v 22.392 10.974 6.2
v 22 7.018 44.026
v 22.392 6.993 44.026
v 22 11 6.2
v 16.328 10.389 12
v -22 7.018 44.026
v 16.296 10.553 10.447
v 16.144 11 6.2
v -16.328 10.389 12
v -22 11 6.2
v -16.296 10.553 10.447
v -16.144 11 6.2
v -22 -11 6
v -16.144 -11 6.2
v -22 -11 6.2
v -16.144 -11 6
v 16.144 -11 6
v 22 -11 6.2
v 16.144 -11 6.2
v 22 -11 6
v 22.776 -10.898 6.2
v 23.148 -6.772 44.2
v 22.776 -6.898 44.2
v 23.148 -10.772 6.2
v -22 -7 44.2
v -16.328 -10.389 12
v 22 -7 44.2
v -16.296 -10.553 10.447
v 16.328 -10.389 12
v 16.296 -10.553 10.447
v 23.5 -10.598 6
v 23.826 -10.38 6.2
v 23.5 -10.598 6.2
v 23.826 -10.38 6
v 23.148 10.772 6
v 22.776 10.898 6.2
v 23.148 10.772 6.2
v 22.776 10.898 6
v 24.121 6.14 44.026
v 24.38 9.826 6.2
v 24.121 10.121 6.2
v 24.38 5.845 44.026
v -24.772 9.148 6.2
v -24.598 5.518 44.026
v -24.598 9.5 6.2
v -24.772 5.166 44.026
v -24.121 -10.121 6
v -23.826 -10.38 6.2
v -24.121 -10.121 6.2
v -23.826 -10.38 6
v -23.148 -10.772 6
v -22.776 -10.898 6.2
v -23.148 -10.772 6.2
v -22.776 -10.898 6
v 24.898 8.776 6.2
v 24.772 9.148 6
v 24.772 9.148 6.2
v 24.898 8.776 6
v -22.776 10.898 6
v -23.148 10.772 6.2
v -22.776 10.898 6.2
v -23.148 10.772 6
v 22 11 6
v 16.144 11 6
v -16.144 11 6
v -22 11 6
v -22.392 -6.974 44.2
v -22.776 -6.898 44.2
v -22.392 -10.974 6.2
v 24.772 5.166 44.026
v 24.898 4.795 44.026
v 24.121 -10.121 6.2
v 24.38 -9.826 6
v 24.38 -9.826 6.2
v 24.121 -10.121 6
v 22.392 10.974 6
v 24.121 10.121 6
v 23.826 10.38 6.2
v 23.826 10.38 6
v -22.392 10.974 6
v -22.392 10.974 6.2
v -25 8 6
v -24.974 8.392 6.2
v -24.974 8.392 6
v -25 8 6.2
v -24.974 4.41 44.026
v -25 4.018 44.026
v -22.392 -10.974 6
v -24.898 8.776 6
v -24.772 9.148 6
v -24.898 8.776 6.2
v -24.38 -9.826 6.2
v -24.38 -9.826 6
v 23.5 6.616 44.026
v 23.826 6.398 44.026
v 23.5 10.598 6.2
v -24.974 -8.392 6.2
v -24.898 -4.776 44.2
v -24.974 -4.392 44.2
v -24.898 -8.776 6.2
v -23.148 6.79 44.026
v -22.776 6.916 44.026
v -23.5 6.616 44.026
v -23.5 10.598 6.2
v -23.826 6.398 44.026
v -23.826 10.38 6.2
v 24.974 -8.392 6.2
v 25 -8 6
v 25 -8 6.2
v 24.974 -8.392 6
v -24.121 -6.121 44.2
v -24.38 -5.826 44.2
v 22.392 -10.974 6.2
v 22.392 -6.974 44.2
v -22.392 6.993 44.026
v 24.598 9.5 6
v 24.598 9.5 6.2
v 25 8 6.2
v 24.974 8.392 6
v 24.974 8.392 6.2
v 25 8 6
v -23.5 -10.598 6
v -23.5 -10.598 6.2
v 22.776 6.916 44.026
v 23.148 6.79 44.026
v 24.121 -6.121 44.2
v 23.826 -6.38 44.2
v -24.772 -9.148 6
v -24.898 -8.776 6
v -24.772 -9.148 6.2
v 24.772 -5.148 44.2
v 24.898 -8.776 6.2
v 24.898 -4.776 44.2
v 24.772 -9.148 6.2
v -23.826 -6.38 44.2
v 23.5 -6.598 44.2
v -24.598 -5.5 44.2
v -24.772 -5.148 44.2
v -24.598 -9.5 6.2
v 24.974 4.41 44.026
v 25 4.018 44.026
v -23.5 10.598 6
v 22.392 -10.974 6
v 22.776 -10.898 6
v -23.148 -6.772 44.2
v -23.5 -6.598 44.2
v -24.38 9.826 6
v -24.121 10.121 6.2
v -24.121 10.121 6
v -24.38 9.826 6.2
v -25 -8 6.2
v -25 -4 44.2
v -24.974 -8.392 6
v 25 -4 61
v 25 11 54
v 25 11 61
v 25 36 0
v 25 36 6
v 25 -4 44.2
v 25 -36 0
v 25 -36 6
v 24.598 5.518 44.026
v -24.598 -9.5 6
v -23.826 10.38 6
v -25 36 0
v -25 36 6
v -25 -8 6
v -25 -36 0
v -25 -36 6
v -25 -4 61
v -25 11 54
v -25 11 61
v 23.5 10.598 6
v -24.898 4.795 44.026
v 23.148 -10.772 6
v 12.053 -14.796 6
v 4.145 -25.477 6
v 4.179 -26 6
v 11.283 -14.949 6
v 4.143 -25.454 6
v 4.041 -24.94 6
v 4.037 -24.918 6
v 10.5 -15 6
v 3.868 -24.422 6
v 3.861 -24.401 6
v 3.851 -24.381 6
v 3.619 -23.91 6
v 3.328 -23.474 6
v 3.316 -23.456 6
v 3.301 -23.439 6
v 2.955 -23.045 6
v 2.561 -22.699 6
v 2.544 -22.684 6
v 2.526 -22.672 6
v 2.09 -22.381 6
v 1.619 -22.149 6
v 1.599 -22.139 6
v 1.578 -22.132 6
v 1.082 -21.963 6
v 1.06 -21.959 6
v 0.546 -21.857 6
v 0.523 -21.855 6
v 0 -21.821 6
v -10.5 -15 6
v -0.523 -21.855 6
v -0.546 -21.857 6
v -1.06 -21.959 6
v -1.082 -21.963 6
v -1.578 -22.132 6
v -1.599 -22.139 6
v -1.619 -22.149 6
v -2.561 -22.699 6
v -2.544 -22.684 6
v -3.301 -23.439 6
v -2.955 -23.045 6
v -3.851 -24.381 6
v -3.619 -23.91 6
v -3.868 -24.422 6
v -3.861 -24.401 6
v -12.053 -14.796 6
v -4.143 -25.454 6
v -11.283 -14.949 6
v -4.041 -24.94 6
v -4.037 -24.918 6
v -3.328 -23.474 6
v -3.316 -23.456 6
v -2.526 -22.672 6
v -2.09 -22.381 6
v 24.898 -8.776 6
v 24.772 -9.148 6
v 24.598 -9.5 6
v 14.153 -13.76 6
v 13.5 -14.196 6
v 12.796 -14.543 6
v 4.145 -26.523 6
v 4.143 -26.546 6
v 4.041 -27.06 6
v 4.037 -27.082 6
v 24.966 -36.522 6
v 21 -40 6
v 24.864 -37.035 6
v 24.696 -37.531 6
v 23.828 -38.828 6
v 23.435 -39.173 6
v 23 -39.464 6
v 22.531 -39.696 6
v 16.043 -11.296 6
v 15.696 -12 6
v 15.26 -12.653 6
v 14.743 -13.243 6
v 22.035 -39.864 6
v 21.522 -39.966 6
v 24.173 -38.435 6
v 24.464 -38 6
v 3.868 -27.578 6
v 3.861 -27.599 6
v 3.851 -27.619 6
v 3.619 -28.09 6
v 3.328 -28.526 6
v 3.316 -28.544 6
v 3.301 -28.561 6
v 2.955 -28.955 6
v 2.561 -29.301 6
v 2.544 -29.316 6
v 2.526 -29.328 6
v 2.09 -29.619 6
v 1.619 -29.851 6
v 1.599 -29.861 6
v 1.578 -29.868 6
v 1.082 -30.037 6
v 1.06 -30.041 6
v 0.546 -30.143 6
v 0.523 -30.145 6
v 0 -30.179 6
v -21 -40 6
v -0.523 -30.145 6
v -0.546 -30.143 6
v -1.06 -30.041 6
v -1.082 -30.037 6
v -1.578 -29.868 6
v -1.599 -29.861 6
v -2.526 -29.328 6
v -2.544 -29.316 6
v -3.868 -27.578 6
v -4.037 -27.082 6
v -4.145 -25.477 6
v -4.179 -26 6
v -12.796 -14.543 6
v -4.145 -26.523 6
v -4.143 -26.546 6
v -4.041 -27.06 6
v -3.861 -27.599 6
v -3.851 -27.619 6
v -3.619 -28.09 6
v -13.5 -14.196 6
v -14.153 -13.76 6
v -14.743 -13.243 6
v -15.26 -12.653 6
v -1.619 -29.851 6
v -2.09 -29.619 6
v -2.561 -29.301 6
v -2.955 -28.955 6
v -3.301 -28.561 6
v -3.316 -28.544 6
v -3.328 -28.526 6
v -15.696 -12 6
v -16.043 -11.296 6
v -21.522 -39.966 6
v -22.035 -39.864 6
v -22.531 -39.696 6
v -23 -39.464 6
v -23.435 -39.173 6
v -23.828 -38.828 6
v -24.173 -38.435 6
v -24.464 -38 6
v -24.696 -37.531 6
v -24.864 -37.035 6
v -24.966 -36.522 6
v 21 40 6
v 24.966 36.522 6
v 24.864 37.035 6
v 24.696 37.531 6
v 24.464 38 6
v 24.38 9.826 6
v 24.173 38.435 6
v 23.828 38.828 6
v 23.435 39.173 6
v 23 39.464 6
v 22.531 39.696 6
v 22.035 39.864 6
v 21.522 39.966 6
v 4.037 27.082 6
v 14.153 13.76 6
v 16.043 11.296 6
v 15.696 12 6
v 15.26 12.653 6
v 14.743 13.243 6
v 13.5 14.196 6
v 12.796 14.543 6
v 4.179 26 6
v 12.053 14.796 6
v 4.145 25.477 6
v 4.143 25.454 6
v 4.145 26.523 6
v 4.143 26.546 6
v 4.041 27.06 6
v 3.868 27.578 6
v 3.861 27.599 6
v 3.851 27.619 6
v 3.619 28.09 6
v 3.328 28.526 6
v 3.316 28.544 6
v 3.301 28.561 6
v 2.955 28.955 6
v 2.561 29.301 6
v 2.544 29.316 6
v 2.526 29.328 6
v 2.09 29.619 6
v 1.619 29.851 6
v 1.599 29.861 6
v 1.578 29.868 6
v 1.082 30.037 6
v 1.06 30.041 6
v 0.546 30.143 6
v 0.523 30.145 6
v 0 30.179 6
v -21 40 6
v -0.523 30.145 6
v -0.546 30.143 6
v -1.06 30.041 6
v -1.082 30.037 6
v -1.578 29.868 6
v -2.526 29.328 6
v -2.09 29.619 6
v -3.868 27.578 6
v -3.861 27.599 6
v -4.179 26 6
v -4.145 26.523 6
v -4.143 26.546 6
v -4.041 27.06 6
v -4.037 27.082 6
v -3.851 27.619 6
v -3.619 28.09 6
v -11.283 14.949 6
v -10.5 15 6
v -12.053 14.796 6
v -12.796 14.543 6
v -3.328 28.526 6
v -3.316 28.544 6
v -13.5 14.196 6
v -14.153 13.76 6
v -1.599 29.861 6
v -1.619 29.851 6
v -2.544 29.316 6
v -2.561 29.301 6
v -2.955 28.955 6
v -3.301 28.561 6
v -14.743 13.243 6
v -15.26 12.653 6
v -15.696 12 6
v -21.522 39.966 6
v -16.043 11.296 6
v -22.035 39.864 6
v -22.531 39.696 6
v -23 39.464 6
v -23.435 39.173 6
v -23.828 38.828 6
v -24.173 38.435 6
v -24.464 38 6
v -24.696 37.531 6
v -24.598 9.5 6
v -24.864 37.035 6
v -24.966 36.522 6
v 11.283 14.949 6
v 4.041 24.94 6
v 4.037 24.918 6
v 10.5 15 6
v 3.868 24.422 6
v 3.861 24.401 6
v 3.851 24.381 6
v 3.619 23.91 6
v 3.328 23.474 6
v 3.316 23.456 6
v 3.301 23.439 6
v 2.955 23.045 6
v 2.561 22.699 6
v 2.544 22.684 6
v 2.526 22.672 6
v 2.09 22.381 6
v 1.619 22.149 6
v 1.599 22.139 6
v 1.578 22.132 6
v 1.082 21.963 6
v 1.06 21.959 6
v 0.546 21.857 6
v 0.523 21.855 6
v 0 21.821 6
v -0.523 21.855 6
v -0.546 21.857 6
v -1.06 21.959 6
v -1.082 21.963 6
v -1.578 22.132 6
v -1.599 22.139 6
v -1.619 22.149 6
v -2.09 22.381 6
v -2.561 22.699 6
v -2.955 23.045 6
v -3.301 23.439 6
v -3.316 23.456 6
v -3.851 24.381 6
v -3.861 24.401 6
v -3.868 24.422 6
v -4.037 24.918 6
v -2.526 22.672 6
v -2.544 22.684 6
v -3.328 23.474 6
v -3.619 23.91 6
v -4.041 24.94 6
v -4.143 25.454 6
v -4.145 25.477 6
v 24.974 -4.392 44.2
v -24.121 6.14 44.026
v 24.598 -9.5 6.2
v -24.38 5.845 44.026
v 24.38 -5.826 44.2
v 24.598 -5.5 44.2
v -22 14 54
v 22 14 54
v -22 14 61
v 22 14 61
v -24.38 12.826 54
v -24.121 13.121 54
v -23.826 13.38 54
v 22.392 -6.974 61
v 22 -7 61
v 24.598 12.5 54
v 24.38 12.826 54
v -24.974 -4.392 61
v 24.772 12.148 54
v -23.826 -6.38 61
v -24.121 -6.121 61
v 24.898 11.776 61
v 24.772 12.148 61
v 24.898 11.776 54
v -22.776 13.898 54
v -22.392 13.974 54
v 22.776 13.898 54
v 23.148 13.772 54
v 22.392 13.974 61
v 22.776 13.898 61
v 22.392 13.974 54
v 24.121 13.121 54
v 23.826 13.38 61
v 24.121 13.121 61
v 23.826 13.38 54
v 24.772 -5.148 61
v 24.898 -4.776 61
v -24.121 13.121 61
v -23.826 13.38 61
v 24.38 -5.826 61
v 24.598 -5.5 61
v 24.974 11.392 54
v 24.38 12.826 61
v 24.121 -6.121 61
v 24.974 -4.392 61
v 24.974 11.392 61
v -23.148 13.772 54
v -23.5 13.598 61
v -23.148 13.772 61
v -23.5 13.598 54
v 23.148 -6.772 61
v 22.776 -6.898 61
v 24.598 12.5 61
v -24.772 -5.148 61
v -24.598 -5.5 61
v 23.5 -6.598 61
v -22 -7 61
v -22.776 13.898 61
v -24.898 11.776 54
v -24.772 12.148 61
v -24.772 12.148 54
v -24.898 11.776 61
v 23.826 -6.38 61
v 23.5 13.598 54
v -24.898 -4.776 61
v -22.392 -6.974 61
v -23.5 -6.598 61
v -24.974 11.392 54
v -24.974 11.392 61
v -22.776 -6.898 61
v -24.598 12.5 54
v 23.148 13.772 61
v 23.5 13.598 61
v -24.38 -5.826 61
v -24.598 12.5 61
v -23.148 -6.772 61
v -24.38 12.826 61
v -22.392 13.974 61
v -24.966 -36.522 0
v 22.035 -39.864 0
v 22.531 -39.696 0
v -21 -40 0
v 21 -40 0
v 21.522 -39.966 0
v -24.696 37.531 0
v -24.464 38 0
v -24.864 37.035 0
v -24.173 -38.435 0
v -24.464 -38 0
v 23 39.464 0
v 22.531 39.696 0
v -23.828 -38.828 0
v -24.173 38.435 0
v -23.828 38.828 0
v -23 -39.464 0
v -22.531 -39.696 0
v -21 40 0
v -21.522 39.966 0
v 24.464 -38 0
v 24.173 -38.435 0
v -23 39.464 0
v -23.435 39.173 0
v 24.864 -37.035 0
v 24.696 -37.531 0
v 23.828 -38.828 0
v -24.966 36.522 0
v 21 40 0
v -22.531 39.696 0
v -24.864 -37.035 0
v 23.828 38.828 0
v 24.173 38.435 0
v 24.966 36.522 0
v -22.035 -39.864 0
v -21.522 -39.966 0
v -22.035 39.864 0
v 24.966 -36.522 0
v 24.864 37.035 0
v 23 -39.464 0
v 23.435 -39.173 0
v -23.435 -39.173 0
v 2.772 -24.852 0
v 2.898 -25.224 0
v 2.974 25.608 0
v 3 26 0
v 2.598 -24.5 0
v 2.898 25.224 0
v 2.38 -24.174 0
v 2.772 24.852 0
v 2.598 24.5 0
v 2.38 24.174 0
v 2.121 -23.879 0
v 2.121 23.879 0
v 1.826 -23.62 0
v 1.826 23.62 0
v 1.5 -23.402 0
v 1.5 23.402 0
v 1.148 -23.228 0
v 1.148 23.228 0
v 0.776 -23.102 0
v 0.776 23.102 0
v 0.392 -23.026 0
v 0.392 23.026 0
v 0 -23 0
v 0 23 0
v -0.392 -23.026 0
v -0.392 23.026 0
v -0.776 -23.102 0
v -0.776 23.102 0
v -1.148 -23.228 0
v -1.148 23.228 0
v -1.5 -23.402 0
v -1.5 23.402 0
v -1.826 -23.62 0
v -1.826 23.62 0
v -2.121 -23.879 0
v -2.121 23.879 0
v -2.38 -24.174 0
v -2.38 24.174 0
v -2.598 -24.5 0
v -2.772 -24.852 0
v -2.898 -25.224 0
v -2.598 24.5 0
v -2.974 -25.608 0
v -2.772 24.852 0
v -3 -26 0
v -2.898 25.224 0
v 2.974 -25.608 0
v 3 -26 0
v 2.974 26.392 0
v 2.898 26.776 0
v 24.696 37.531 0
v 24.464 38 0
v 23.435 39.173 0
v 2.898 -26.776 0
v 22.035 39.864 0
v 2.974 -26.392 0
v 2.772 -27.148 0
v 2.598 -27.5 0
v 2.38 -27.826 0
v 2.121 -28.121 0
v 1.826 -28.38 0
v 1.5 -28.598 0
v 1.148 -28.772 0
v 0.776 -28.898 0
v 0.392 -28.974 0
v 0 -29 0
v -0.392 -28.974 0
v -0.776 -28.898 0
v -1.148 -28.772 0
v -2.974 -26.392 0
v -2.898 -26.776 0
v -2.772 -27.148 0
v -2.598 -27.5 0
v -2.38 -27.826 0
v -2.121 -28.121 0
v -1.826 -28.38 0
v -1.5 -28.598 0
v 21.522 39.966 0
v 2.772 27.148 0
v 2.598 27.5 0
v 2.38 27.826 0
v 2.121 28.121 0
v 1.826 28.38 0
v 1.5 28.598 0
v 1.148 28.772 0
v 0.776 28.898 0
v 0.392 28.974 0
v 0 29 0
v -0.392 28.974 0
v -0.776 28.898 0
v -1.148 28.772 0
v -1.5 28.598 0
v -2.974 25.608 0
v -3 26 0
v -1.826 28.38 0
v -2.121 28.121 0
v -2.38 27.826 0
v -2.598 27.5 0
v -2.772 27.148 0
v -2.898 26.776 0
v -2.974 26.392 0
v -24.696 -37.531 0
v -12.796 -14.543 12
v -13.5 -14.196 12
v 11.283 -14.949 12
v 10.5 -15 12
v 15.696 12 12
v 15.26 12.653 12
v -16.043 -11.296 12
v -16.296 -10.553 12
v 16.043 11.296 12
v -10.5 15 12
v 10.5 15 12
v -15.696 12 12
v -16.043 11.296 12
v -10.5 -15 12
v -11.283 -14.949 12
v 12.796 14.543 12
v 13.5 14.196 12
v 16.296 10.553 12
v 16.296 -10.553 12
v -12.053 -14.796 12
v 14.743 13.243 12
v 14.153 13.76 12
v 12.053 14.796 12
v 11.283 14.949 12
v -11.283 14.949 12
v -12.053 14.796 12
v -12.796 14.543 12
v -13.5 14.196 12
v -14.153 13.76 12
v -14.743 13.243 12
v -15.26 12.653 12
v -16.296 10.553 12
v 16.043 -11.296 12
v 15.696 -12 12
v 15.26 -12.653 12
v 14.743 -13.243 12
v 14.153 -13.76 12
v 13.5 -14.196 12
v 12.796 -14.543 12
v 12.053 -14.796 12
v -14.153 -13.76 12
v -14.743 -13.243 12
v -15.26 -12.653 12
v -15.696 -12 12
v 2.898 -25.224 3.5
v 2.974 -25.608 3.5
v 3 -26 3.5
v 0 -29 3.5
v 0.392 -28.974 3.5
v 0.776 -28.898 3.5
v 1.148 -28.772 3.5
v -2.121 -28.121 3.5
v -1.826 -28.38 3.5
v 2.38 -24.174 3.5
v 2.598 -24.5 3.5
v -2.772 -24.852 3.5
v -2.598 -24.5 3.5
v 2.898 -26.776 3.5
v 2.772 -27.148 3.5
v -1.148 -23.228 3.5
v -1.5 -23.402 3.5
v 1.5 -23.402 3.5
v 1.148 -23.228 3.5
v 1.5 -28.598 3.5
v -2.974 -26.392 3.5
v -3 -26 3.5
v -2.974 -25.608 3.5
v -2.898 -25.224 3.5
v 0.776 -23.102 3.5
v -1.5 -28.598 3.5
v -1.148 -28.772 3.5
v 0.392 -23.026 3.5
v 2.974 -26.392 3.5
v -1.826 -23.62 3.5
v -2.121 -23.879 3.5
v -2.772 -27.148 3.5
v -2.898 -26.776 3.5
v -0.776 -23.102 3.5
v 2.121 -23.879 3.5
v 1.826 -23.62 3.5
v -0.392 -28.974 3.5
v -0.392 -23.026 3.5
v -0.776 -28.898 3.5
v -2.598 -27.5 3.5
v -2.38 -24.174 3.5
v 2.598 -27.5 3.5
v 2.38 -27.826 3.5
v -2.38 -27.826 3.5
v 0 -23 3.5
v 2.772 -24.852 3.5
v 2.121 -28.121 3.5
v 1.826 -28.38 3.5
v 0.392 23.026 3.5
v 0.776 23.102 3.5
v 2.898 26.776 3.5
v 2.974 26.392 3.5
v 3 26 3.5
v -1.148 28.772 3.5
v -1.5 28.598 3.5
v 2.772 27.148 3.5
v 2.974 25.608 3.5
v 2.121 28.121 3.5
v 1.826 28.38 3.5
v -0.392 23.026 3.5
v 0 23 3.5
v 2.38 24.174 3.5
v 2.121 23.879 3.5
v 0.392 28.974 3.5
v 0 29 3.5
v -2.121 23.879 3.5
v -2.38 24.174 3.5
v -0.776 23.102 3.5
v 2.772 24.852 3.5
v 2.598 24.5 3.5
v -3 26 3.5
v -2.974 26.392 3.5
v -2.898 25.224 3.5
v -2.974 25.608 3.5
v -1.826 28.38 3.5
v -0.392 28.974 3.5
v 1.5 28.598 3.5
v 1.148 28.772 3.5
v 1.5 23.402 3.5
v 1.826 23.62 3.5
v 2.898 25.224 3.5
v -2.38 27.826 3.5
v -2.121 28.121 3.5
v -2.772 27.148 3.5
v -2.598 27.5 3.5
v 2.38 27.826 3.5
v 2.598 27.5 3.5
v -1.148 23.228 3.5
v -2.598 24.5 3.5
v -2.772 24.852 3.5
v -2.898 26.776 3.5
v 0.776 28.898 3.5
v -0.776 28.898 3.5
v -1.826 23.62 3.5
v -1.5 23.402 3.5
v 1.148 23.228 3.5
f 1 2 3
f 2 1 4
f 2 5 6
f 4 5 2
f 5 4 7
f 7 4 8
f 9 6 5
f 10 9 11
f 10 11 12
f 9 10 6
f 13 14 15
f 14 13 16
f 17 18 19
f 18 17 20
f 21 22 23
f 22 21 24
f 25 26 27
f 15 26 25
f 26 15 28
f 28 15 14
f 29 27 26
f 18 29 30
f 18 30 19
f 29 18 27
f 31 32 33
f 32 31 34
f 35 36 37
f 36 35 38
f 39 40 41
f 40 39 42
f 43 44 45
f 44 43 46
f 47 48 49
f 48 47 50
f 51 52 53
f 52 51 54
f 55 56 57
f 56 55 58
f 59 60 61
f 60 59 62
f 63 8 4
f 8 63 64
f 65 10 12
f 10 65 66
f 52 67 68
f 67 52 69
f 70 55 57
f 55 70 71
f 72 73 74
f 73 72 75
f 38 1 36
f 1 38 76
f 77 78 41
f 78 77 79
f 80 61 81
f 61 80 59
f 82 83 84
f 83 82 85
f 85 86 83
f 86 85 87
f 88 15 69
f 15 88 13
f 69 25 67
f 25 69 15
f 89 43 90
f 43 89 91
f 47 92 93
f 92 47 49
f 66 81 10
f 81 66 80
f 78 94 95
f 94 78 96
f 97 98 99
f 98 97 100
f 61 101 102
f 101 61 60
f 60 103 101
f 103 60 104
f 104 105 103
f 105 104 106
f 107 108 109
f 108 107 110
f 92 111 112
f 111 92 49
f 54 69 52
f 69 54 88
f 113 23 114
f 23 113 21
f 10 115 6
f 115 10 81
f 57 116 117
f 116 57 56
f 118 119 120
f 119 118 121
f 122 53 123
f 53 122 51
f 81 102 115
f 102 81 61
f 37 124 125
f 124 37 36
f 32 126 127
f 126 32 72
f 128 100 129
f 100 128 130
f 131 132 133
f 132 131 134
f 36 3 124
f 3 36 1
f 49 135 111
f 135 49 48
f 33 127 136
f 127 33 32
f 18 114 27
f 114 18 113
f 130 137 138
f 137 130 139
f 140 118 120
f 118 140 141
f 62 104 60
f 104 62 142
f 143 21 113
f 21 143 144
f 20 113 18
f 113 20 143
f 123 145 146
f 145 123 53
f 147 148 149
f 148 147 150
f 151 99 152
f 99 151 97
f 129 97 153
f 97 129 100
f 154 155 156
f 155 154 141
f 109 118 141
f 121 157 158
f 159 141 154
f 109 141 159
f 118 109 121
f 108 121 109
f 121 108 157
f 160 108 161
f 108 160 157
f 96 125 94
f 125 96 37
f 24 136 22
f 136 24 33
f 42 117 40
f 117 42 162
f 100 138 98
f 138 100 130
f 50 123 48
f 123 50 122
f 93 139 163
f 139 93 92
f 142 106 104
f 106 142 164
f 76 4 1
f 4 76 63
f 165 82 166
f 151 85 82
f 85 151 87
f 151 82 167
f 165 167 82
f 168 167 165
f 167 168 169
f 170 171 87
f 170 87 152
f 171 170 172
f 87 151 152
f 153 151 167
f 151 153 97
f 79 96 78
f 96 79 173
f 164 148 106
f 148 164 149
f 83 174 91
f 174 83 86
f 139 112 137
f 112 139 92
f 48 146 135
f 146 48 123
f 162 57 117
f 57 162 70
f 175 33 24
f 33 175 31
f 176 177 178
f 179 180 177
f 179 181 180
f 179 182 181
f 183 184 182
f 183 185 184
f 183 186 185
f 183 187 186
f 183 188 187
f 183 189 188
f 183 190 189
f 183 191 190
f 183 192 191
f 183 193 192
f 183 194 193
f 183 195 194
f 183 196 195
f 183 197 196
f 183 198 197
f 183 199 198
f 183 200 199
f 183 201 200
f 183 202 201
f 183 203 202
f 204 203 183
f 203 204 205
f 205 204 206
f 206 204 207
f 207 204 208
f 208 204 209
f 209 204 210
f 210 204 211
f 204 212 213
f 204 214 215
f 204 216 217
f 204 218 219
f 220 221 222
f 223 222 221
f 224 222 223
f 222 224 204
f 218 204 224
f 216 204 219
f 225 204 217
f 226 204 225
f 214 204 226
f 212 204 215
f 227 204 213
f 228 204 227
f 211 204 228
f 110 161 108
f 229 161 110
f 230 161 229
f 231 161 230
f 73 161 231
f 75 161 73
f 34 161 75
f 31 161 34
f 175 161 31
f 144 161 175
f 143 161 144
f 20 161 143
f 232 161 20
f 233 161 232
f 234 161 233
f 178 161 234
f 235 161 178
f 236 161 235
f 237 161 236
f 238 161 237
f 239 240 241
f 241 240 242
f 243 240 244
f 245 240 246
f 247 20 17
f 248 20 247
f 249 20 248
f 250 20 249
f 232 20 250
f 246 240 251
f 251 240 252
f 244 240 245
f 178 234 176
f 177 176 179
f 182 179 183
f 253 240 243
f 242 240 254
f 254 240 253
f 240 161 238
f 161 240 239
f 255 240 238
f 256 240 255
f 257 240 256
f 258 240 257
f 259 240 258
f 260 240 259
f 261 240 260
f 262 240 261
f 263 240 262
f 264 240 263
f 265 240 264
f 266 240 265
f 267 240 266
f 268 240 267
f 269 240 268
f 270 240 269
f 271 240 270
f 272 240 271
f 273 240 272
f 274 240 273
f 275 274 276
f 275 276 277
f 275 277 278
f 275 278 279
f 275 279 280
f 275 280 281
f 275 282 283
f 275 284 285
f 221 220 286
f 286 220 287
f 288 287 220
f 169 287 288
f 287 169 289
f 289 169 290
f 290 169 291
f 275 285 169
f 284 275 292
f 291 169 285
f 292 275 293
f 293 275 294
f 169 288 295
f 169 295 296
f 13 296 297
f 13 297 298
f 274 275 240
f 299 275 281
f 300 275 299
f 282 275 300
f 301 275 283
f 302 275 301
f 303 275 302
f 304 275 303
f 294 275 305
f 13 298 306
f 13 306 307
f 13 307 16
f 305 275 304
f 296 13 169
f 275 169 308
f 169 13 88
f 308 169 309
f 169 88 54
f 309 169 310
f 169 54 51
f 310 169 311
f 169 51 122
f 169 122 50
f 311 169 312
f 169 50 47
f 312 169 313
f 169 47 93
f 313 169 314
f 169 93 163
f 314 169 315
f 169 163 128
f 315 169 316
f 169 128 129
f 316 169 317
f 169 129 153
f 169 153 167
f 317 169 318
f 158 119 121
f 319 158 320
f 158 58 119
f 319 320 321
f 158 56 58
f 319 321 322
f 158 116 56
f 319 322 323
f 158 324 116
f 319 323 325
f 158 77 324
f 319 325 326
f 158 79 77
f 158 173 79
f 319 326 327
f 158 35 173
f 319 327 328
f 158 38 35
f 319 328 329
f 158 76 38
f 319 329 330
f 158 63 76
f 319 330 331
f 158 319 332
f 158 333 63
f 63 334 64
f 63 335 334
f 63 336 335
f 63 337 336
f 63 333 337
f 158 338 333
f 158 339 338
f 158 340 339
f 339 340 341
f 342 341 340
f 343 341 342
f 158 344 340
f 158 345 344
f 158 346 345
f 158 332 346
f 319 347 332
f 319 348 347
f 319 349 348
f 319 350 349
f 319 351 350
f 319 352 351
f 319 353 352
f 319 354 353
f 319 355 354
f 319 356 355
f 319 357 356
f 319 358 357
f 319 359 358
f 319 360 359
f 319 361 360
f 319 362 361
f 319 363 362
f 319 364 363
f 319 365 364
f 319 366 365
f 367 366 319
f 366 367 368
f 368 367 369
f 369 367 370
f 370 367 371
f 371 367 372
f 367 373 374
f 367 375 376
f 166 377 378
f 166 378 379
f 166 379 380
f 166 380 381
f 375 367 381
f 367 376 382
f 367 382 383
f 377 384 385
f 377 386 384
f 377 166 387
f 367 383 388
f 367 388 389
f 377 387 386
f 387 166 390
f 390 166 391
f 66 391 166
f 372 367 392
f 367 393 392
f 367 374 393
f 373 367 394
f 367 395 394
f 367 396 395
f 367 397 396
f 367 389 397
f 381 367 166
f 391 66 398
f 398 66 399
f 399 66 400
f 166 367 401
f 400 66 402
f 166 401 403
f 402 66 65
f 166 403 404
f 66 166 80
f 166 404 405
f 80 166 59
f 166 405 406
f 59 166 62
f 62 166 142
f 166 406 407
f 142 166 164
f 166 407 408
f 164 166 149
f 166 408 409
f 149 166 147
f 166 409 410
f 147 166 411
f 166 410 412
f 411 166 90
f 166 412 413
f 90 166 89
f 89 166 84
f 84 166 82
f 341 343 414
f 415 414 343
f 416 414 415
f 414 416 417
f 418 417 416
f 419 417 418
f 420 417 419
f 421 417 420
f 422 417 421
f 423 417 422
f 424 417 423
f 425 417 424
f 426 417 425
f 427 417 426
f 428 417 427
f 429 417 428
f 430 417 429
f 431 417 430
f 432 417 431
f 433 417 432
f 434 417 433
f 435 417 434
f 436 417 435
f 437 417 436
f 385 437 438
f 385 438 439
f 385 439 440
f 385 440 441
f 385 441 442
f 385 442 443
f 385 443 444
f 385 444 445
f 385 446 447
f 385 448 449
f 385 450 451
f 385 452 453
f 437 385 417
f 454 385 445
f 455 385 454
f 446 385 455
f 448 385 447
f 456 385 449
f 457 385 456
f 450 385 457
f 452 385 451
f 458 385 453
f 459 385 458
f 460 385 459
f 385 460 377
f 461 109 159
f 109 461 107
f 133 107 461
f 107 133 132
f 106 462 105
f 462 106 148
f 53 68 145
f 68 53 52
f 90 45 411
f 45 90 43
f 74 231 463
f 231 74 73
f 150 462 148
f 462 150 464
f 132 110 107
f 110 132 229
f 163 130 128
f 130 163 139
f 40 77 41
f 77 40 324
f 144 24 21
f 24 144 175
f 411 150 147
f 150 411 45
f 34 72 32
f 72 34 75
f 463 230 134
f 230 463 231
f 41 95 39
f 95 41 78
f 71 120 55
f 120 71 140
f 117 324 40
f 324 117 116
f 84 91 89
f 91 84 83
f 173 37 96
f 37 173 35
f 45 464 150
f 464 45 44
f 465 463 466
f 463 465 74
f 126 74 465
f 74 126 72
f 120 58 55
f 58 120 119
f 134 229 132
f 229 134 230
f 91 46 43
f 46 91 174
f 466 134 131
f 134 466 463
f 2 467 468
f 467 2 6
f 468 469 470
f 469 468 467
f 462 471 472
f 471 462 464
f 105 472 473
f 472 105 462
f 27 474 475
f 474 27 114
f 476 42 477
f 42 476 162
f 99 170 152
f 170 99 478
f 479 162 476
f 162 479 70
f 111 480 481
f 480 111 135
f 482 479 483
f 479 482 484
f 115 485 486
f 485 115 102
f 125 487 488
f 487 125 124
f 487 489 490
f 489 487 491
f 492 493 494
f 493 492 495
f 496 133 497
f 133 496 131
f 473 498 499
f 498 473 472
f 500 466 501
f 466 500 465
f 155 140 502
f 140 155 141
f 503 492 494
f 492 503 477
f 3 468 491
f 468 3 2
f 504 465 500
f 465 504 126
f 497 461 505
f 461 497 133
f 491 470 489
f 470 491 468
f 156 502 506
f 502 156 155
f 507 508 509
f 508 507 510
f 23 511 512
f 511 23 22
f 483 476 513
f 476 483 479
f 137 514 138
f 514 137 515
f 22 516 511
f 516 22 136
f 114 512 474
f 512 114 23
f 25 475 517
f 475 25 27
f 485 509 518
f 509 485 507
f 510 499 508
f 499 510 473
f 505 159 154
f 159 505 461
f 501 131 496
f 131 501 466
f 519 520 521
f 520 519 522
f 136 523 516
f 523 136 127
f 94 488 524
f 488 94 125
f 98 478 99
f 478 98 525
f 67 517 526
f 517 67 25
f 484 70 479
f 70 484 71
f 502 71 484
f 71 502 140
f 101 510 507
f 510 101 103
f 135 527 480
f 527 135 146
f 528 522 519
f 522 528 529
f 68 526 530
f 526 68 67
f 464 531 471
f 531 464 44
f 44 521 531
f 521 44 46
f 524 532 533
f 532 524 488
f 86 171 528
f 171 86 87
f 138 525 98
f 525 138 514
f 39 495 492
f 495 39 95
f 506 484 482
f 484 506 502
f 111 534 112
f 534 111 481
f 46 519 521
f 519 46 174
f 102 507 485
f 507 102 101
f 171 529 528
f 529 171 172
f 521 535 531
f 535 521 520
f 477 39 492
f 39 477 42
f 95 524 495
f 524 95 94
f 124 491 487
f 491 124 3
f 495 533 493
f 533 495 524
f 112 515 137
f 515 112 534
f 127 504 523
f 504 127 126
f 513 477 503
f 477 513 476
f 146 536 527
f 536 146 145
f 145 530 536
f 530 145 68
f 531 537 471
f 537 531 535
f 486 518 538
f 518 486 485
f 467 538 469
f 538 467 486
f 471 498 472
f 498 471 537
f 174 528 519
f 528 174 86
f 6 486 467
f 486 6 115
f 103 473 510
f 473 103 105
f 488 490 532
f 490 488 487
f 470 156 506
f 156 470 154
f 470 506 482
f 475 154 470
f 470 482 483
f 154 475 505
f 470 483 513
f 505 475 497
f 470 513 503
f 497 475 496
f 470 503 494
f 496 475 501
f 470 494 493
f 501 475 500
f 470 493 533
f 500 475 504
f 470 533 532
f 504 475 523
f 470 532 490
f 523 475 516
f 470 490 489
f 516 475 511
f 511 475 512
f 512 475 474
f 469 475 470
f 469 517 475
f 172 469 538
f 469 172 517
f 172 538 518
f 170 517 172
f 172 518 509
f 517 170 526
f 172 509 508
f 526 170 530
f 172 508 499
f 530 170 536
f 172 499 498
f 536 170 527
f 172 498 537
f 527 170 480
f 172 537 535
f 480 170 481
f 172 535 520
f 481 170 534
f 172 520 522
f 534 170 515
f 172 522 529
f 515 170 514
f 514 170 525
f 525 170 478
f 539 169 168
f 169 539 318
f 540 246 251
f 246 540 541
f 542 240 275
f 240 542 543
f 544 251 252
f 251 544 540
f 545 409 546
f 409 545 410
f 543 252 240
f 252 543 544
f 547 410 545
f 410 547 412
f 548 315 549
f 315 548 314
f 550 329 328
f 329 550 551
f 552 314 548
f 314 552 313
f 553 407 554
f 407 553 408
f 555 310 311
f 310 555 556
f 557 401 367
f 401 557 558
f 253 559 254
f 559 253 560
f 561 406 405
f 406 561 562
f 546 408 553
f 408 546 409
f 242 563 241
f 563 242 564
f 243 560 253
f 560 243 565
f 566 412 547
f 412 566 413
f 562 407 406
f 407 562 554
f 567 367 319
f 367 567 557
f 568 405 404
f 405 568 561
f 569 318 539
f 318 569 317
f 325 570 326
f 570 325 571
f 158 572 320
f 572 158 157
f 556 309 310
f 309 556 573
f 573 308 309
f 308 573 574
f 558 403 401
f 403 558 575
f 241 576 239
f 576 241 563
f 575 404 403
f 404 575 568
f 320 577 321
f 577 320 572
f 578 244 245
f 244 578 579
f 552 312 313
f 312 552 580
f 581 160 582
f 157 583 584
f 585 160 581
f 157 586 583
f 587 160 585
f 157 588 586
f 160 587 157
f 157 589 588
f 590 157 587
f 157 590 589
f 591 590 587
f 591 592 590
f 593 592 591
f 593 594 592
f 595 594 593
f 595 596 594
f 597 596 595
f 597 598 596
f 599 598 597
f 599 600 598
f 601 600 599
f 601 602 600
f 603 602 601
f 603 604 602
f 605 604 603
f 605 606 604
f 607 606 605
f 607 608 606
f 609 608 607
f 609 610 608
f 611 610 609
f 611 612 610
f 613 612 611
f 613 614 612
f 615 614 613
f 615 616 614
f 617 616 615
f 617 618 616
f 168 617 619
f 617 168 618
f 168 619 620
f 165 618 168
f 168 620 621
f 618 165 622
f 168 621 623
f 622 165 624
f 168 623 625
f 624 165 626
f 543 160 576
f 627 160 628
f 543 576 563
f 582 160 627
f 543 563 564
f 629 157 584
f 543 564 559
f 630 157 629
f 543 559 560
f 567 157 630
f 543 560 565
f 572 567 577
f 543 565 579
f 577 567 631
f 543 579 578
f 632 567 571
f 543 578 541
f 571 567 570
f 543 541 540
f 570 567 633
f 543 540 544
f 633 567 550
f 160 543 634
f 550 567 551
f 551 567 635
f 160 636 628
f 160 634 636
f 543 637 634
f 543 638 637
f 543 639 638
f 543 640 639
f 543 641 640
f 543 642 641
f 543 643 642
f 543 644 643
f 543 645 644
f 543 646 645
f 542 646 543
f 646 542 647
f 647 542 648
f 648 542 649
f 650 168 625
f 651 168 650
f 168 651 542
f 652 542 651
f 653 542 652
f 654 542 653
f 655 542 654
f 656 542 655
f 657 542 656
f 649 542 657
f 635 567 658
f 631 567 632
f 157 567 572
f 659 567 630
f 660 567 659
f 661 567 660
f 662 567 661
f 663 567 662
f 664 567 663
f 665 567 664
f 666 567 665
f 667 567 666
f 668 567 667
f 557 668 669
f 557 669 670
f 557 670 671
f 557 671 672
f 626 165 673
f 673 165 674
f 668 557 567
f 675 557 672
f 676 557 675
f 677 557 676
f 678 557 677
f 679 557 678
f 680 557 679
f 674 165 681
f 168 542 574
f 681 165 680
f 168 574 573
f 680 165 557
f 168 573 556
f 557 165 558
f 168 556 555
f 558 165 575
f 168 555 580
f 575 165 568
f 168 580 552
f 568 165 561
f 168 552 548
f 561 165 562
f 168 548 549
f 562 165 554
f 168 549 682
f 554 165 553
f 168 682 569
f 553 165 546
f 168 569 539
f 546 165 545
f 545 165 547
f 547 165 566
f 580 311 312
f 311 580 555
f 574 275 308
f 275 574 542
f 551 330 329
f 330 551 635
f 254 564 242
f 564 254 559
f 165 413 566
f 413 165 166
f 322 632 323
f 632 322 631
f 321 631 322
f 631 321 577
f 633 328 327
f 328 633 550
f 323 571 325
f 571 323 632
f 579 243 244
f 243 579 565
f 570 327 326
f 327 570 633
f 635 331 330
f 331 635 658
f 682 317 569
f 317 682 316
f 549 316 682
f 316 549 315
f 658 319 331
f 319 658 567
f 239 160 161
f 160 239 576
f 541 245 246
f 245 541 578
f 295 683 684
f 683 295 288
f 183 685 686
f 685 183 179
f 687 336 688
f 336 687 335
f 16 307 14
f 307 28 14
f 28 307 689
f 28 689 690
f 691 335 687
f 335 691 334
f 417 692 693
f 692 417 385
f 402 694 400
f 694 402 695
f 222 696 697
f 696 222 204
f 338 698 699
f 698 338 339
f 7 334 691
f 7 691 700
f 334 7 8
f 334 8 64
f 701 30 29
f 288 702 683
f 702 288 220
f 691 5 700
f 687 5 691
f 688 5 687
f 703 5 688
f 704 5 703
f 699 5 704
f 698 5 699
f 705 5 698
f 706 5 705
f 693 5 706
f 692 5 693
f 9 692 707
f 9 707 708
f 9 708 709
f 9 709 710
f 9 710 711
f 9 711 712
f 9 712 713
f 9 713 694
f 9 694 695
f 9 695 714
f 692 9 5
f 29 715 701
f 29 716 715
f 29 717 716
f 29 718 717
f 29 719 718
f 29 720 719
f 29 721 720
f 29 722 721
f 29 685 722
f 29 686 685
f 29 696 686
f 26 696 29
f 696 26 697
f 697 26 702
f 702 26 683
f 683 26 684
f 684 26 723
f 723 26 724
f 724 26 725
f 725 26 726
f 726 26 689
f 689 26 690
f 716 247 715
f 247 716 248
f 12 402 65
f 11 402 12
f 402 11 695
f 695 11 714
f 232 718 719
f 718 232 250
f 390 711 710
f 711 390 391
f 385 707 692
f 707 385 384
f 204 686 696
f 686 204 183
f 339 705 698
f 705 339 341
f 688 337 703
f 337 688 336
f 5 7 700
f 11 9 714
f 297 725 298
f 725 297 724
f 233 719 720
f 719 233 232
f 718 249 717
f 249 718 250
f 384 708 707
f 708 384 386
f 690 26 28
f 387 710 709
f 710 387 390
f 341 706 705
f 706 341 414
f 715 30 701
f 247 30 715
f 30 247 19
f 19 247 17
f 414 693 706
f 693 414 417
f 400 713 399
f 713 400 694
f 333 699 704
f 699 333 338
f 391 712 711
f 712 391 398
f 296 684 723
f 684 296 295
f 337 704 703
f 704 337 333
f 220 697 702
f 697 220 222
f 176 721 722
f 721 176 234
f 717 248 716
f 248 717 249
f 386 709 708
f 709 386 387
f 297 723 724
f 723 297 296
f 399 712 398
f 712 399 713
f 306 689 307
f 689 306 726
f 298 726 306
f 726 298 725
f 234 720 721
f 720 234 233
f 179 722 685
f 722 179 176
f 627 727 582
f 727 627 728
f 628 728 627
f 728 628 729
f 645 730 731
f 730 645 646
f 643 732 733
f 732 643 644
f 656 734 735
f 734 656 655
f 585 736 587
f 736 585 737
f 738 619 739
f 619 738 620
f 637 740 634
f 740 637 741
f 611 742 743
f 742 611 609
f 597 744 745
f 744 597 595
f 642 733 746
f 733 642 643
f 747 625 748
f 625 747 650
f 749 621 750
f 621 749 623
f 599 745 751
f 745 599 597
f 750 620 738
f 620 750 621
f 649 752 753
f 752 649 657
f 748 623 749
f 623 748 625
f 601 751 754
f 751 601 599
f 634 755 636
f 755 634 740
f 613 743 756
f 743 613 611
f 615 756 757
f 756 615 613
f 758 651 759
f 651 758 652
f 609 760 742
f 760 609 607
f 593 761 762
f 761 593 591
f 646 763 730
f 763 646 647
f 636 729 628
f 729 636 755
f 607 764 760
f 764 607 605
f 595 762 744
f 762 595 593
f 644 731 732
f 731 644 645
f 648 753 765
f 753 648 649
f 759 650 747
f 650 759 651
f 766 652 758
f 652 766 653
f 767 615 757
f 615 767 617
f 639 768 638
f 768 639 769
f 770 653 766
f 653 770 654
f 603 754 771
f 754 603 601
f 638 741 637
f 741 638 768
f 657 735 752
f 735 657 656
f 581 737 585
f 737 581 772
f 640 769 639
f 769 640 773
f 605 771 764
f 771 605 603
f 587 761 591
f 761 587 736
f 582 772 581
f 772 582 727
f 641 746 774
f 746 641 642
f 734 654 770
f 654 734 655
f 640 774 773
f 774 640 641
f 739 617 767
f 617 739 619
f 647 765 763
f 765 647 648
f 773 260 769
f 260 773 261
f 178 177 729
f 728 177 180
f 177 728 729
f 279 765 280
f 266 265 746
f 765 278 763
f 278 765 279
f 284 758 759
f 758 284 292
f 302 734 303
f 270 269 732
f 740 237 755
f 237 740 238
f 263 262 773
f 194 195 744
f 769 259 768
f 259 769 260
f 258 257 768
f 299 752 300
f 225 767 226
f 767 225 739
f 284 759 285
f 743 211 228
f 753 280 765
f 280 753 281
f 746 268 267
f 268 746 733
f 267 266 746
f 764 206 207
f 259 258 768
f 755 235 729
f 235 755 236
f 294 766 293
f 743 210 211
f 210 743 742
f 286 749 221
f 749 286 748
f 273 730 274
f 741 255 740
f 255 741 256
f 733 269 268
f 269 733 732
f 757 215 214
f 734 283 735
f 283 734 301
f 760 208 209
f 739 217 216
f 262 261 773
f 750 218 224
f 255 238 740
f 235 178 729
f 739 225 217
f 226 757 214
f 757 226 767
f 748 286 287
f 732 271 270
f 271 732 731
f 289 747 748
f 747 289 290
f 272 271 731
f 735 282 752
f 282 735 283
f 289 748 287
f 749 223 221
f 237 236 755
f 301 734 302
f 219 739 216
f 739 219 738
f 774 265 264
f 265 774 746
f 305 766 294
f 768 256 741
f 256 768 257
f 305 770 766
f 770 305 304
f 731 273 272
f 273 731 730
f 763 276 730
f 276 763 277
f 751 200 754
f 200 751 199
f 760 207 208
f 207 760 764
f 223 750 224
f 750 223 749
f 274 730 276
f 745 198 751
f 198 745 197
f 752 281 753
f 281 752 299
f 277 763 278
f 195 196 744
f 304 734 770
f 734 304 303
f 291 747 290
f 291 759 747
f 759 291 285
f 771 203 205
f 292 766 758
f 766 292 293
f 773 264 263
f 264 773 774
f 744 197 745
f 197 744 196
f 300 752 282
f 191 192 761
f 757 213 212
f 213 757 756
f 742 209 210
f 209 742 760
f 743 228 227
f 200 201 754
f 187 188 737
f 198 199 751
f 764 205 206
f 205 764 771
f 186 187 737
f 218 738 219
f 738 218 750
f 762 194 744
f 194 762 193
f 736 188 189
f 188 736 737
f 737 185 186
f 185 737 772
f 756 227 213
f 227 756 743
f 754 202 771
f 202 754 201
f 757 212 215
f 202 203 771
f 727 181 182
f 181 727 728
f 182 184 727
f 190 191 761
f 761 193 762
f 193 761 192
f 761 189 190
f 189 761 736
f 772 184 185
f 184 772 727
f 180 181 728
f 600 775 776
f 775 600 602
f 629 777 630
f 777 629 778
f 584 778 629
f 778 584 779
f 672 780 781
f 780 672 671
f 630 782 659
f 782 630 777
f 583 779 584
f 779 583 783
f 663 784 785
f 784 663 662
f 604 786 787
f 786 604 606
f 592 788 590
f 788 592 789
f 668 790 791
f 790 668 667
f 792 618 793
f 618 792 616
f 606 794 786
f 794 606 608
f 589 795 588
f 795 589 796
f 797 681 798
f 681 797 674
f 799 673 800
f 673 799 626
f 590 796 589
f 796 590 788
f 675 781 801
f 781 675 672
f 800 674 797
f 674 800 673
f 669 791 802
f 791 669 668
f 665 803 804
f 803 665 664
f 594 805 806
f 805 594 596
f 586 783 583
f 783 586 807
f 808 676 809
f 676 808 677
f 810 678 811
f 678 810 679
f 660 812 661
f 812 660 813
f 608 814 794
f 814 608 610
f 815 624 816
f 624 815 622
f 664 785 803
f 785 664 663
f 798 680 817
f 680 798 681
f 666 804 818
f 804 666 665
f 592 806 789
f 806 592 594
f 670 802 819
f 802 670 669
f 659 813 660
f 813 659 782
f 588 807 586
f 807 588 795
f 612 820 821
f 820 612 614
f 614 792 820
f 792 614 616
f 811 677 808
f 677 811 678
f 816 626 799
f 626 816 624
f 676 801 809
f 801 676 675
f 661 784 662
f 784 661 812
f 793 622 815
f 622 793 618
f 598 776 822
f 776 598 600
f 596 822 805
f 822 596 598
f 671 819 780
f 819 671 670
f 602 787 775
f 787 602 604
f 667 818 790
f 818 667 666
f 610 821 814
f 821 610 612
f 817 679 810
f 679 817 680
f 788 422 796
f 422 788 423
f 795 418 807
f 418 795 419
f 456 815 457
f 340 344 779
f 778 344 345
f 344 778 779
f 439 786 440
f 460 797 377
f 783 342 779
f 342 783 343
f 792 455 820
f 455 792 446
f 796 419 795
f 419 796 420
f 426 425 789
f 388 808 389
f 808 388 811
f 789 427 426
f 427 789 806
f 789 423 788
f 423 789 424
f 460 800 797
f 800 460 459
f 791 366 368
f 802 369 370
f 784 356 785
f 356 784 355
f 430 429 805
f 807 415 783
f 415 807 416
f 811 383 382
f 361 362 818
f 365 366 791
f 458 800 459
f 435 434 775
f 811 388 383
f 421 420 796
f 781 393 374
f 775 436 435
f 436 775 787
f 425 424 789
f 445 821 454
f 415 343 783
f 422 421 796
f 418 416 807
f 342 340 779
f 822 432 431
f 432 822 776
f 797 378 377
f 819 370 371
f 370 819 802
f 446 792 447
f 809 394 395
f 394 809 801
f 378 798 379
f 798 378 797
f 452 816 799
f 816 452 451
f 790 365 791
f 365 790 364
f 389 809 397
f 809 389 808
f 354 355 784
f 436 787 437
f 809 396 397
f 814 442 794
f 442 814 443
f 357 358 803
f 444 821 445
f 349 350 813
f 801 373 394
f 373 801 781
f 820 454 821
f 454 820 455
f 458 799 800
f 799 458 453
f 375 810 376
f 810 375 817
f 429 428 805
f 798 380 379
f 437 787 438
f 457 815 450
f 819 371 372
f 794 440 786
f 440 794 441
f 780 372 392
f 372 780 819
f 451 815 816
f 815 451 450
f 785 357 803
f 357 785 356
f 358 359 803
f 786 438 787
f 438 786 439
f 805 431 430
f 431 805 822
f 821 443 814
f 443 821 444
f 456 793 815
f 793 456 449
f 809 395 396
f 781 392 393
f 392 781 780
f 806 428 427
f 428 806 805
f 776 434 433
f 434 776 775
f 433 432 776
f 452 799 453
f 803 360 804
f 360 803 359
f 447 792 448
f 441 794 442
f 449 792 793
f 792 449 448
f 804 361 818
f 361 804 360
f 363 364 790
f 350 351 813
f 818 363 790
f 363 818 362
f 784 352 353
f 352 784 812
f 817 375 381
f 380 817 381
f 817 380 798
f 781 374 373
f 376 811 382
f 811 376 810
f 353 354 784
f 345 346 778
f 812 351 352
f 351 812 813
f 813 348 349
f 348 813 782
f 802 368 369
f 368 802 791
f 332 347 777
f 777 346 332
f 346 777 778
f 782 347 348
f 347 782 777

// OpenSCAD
// Parametric wall-mounted headphone hook
// Units: millimeters
// Print orientation: place the flat wall side of the plate on the build plate.

$fn = 48;

// Main required dimensions
plate_height = 80;
plate_width = 50;
plate_thickness = 6;
hook_projection = 55;

// Hook shape
hook_width = 50;
hook_base_height = 22;
hook_tip_height = 14;
hook_corner_radius = 3;
front_lip_rise = 7;
front_lip_depth = 7;
front_lip_ramp_depth = 10;

// Root reinforcement on the plate face
root_pad_width = 33;
root_pad_height = 30;
root_pad_thickness = 6;
root_pad_radius = 6;

// Screw holes for 4 mm screws
screw_hole_diameter = 6;
screw_spacing = 52;
screw_head_diameter = 8.5;
screw_head_depth = 2.5;

// Edge detail
plate_corner_radius = 4;
clearance = 0.15;

module rounded_rect_2d(width, height, radius) {
  safe_radius = min(radius, min(width, height) / 2 - 0.01);
  offset(r = safe_radius)
    square([
      max(0.01, width - 2 * safe_radius),
      max(0.01, height - 2 * safe_radius)
    ], center = true);
}

module rounded_box(size, radius) {
  linear_extrude(height = size[2])
    rounded_rect_2d(size[0], size[1], radius);
}

module screw_holes() {
  for (y_pos = [-screw_spacing / 2, screw_spacing / 2]) {
    translate([0, y_pos, -clearance])
      cylinder(h = plate_thickness + 2 * clearance, d = screw_hole_diameter);

    if (screw_head_depth > 0 && screw_head_diameter > screw_hole_diameter) {
      translate([0, y_pos, plate_thickness - screw_head_depth])
        cylinder(
          h = screw_head_depth + clearance,
          d1 = screw_hole_diameter,
          d2 = screw_head_diameter
        );
    }
  }
}

module hook_body() {
  hook_end_z = plate_thickness + hook_projection;
  lip_ramp_start_z = hook_end_z - front_lip_depth - front_lip_ramp_depth;
  lip_start_z = hook_end_z - front_lip_depth;

  // Main arm tapers slightly as it projects from the wall plate.
  hull() {
    translate([0, 0, plate_thickness])
      rounded_box([hook_width, hook_base_height, 0.2], hook_corner_radius);
    translate([0, 0, lip_ramp_start_z])
      rounded_box([hook_width, hook_tip_height, 0.2], hook_corner_radius);
  }

  // The front lip grows gradually, keeping overhangs near 45 degrees or less.
  hull() {
    translate([0, 0, lip_ramp_start_z])
      rounded_box([hook_width, hook_tip_height, 0.2], hook_corner_radius);
    translate([0, front_lip_rise / 2, lip_start_z])
      rounded_box([hook_width, hook_tip_height + front_lip_rise, 0.2], hook_corner_radius);
  }

  translate([0, front_lip_rise / 2, lip_start_z])
    rounded_box([hook_width, hook_tip_height + front_lip_rise, front_lip_depth], hook_corner_radius);
}

module model() {
  difference() {
    union() {
      rounded_box([plate_width, plate_height, plate_thickness], plate_corner_radius);

      translate([0, 0, plate_thickness])
        rounded_box([root_pad_width, root_pad_height, root_pad_thickness], root_pad_radius);

      hook_body();
    }

    screw_holes();
  }
}

model();
